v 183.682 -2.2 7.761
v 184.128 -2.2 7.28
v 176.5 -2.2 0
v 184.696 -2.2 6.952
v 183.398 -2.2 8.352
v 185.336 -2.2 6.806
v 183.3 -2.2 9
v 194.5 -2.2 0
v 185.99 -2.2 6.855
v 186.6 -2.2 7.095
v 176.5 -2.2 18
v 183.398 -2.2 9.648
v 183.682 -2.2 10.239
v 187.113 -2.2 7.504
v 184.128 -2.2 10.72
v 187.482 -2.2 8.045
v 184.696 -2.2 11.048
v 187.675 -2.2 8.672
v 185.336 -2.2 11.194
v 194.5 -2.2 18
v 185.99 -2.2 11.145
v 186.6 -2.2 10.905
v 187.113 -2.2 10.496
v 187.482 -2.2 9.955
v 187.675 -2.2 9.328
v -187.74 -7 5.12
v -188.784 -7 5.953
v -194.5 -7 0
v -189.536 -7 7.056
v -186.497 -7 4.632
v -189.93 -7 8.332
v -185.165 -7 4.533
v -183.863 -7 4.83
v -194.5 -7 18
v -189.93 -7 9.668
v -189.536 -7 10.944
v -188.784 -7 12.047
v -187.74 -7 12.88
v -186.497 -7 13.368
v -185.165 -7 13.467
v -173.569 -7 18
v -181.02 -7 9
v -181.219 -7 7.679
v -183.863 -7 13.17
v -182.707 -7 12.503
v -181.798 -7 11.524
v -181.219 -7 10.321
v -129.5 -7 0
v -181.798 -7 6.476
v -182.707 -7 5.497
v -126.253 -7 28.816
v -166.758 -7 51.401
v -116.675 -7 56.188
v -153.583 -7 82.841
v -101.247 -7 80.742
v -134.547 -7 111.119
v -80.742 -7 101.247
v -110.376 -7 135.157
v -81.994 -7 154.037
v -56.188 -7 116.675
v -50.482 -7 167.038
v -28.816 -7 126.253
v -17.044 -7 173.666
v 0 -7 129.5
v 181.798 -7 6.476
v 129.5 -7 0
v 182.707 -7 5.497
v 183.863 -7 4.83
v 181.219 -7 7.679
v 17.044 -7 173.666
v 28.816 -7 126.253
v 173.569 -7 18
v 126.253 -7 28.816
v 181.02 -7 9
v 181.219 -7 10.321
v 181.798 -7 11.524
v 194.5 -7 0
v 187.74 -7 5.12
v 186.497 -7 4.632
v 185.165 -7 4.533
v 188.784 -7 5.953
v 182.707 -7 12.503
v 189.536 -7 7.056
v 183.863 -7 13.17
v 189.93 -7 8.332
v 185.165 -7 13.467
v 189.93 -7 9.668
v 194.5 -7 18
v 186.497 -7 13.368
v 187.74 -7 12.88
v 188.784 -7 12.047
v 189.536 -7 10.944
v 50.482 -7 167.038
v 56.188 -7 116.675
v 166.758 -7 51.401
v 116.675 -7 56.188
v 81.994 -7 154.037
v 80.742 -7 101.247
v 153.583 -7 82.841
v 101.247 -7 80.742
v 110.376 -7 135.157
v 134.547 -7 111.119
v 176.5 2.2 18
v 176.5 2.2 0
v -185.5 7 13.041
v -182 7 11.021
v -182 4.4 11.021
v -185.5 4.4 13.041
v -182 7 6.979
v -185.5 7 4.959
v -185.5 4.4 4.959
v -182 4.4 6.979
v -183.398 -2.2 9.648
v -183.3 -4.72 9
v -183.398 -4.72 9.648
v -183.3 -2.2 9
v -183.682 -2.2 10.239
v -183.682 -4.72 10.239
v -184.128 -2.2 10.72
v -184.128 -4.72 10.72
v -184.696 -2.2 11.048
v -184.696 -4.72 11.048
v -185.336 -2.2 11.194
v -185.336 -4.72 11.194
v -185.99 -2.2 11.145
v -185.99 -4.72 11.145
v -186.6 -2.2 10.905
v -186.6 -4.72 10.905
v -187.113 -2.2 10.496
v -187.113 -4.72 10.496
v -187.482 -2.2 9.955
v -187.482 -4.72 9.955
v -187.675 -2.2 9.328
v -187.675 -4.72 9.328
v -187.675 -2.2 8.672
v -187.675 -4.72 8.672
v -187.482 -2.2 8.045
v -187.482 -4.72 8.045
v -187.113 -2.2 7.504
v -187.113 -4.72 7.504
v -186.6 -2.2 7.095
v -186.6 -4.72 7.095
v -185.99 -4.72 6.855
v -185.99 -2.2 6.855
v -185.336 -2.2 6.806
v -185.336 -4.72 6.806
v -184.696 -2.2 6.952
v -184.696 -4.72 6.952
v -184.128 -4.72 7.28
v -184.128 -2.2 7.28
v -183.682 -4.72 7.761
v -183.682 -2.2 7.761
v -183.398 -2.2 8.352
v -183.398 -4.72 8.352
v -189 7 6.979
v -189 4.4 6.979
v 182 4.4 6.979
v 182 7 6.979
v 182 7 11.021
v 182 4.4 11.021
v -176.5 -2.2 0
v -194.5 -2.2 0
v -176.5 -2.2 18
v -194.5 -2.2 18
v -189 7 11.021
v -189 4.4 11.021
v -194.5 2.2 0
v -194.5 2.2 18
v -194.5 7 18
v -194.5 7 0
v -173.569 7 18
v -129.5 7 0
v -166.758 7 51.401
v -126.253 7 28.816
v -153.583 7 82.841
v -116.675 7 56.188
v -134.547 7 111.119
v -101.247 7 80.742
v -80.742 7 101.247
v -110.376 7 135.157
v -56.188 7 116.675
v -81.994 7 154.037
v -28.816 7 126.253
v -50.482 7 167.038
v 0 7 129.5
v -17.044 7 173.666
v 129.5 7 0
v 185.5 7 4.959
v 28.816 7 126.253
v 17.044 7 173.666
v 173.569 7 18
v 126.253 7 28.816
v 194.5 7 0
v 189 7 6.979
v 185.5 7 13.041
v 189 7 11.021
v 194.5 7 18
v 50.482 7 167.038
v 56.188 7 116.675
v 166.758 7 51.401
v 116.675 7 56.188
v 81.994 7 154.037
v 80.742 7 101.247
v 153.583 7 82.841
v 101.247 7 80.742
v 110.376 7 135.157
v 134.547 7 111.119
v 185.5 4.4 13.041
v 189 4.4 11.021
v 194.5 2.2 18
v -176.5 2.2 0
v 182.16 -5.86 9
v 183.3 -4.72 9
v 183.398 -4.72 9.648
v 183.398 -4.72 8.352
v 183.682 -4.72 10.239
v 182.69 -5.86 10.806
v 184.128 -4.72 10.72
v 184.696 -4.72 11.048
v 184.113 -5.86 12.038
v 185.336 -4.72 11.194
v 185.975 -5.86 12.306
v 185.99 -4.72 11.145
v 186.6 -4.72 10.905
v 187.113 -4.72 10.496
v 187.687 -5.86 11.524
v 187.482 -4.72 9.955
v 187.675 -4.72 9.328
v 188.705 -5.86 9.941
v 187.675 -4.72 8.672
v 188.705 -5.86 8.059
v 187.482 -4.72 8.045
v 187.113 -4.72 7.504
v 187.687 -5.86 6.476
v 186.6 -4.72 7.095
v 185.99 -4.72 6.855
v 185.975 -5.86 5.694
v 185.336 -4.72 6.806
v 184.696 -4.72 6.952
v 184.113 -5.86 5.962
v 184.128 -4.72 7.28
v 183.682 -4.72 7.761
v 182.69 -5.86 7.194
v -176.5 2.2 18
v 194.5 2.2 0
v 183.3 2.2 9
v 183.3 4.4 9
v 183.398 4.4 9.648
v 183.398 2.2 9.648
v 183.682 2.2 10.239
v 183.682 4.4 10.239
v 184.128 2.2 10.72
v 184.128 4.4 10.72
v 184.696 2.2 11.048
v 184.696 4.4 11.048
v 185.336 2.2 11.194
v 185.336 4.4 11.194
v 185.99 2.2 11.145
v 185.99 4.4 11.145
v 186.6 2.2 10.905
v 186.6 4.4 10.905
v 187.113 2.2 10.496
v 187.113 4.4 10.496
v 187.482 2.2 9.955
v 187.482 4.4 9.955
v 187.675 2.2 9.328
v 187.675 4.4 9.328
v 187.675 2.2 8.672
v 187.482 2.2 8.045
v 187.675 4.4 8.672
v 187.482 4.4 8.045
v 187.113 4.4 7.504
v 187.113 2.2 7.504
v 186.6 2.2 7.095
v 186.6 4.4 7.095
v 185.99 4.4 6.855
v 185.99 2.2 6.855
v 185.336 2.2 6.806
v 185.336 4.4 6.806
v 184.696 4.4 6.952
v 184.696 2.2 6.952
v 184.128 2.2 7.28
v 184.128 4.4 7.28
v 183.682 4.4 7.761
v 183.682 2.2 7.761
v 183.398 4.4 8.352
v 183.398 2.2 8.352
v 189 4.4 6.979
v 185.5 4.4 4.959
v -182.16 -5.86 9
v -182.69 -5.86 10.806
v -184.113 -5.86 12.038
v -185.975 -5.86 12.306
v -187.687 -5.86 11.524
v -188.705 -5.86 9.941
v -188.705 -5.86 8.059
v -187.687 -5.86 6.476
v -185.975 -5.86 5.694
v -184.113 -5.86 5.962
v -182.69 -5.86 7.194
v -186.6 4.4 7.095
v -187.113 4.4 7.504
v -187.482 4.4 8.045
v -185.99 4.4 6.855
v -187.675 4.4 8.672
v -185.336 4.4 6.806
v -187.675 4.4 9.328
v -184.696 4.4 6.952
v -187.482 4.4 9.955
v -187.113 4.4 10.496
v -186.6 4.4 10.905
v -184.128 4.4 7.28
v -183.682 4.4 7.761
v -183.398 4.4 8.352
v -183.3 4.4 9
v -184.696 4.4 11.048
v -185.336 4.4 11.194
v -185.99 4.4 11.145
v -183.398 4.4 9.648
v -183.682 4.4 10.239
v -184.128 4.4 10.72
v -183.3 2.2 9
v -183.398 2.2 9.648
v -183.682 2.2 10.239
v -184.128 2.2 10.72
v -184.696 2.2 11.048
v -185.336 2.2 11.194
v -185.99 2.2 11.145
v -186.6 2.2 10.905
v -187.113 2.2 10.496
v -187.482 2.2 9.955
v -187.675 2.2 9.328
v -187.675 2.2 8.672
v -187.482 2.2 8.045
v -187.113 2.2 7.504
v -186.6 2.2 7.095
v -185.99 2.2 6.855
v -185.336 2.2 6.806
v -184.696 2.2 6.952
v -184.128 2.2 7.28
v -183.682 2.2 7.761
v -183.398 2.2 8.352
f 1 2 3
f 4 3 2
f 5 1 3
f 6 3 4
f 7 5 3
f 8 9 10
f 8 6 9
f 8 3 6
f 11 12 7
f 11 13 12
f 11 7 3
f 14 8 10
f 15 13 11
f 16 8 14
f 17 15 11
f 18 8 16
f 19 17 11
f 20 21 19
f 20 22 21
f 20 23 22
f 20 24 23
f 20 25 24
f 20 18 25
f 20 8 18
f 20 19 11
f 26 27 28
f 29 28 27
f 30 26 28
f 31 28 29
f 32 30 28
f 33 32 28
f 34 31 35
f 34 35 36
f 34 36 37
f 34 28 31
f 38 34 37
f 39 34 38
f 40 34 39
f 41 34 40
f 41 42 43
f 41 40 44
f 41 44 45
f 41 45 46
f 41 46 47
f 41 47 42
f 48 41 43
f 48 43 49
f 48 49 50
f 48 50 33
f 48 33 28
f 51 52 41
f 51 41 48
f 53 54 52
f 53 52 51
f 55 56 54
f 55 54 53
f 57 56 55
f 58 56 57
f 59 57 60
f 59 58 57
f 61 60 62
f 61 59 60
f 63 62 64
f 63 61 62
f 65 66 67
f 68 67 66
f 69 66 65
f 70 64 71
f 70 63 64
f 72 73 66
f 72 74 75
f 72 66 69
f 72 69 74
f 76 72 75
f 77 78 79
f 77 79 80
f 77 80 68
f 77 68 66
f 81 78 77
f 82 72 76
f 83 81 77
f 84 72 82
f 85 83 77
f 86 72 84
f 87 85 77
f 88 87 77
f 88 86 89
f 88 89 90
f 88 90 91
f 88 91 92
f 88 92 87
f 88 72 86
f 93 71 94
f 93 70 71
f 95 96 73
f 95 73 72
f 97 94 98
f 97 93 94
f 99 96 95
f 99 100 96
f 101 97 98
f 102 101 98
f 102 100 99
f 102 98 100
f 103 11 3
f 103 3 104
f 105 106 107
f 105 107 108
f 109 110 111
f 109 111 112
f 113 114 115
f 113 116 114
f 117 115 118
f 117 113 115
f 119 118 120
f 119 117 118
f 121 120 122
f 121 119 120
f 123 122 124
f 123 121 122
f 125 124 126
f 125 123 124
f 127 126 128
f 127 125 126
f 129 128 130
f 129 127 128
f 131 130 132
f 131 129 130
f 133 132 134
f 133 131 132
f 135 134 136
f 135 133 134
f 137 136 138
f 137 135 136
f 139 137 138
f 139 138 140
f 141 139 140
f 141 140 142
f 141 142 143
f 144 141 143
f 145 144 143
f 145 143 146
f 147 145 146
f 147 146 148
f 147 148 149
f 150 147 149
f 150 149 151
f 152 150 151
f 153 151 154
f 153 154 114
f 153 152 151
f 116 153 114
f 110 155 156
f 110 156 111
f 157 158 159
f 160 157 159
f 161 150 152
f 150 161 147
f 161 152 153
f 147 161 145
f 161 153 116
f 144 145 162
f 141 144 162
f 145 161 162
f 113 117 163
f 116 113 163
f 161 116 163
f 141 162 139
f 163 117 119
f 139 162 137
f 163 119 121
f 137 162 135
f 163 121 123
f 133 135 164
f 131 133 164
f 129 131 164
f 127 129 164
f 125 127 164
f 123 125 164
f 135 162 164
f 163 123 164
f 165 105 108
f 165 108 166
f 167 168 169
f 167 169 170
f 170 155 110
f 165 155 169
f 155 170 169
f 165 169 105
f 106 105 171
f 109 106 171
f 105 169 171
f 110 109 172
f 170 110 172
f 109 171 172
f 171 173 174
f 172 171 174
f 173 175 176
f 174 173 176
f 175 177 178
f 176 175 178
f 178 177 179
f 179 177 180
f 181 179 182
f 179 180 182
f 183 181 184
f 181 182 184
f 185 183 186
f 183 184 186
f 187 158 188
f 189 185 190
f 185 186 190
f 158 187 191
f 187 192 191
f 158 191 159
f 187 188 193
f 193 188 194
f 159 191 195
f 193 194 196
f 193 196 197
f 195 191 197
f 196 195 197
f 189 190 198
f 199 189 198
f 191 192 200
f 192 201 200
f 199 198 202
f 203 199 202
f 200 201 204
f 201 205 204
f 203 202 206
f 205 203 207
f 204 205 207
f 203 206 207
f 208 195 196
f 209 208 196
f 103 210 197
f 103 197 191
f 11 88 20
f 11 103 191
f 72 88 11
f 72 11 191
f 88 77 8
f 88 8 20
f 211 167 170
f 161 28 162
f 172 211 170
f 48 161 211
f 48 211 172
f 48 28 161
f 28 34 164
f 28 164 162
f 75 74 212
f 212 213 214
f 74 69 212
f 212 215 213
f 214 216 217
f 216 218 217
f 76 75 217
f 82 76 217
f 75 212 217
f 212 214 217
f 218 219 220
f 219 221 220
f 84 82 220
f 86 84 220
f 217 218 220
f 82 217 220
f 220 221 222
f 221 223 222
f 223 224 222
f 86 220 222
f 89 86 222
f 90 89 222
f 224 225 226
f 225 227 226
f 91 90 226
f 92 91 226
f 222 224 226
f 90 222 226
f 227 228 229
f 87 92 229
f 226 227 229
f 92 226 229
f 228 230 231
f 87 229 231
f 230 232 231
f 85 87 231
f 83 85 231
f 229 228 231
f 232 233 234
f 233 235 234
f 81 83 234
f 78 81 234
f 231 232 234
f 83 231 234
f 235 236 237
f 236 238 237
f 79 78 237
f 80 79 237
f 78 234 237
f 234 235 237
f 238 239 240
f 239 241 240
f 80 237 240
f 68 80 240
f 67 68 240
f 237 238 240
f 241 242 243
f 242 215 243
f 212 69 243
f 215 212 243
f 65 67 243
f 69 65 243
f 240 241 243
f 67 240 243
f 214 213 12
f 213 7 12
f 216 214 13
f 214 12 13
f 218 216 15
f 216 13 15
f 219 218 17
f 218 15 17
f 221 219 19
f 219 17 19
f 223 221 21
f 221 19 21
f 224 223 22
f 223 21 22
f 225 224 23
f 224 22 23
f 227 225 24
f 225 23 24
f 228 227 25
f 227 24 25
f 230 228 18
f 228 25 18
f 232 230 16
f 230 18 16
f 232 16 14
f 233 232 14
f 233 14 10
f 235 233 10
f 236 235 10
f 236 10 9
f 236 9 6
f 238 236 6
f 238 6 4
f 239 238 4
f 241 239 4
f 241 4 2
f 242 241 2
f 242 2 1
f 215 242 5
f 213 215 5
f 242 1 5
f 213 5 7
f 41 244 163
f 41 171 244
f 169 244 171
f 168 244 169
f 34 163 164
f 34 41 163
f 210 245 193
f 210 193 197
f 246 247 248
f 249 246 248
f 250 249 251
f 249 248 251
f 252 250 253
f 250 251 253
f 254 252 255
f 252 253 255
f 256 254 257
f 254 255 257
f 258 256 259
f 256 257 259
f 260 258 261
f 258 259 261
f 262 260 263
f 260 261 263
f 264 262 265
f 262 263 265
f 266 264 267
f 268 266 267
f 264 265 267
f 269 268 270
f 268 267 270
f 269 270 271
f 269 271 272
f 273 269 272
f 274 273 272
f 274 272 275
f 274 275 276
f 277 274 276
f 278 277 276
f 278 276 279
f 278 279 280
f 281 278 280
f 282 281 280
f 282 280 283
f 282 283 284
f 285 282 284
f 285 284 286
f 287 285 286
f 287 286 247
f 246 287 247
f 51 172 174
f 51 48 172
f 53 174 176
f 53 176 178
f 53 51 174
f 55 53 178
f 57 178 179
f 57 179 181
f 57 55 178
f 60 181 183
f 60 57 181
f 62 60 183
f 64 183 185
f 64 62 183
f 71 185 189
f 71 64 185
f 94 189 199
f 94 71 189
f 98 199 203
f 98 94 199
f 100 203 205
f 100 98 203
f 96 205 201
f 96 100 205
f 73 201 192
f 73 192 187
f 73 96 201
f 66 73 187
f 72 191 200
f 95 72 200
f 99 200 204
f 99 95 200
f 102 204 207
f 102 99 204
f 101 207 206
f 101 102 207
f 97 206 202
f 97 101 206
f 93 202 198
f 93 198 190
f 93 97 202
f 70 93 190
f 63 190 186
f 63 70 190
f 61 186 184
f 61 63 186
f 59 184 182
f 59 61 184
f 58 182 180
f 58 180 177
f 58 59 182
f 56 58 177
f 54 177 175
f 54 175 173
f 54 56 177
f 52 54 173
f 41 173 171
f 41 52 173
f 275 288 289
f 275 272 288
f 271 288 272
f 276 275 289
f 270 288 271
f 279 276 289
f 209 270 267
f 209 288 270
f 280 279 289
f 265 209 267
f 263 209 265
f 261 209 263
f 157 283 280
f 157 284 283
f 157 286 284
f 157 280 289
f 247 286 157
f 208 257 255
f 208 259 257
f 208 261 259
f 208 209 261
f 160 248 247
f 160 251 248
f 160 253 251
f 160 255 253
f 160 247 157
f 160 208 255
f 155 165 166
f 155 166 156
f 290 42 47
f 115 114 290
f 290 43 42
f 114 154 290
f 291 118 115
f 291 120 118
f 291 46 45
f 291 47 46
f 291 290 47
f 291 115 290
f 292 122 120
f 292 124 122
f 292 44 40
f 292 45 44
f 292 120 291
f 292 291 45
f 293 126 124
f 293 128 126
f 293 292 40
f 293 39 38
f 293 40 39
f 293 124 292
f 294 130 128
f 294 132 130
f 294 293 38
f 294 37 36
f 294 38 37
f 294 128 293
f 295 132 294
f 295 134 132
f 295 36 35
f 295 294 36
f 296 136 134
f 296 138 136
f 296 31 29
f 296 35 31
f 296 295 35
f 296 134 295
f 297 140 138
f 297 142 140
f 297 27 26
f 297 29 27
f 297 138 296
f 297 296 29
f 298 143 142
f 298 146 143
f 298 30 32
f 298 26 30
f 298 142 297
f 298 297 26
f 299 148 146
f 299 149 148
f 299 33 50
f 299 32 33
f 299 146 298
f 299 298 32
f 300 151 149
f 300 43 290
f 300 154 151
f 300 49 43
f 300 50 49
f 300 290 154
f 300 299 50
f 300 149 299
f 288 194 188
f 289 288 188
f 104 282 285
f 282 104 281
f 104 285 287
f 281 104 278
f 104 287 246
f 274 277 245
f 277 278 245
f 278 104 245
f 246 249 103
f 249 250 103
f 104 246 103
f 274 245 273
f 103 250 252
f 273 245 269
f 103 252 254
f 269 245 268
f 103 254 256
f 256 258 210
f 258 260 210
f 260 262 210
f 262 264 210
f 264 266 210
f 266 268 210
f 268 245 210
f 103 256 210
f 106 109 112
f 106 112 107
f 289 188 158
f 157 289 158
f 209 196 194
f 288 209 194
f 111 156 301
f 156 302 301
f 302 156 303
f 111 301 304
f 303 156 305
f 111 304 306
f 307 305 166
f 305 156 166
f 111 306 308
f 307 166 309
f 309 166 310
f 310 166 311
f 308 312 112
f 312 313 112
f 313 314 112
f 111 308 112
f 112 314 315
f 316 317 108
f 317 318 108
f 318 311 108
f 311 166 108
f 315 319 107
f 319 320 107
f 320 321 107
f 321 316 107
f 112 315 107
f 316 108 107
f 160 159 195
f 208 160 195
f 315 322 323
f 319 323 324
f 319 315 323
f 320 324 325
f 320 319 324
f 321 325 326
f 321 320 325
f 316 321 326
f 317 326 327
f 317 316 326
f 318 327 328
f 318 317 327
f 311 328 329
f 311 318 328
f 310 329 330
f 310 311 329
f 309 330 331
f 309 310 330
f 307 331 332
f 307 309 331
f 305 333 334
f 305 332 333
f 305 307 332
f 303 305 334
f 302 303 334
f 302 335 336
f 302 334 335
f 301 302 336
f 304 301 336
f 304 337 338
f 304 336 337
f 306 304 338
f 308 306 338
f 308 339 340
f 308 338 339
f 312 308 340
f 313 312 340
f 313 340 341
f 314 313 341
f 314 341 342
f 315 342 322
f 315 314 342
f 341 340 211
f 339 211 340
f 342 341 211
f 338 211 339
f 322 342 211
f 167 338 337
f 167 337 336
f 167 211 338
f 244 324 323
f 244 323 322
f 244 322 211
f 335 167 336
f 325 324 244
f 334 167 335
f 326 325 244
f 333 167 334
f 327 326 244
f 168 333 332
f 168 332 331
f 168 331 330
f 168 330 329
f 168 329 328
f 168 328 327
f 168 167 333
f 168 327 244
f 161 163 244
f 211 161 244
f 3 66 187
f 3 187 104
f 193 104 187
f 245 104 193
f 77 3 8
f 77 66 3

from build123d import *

# Parameters (mm, degrees)
F1_DEPTH       = 7
F2_DEPTH       = 6
F3_W           = 4.4
F3_H           = 18
F4_DEPTH       = 18
F6_D           = 4.4
F6_DEPTH       = 5
F6_CSINK_D     = 8.96
F6_CSINK_ANGLE = 90
F6_TIP         = 1.3218933619
F8_DEPTH       = 2.6
F9_R           = 2.2
F10_DEPTH      = 2.3


# Not quite as in the source:
# - a pattern or mirror of a feature is missing from the dataset's text; its kind, count and spacing are read off the source's solid


with BuildPart() as f1:
    # F0 (on Front) → F1 (new body, symmetric)
    with BuildSketch(Plane.XZ):
        with BuildLine():
            Line((129.5, 0), (174.5, 0))
            ThreePointArc((174.5, 0), (174.2671322418, 9.0120264206), (173.5691504848, 18))
            ThreePointArc((173.5691504848, 18), (0, 174.5), (-173.5691504848, 18))
            ThreePointArc((-173.5691504848, 18), (-174.2671322418, 9.0120264206), (-174.5, 0))
            Line((-174.5, 0), (-129.5, 0))
            ThreePointArc((-129.5, 0), (0, 129.5), (129.5, 0))
        make_face()
        with BuildLine():
            ThreePointArc((173.5691504848, 18), (174.2671322418, 9.0120264206), (174.5, 0))
            Line((174.5, 0), (194.5, 0))
            Line((194.5, 0), (194.5, 18))
            Line((194.5, 18), (173.5691504848, 18))
        make_face()
        with BuildLine():
            ThreePointArc((-174.5, 0), (-174.2671322418, 9.0120264206), (-173.5691504848, 18))
            Line((-173.5691504848, 18), (-194.5, 18))
            Line((-194.5, 18), (-194.5, 0))
            Line((-194.5, 0), (-174.5, 0))
        make_face()
    extrude(amount=F1_DEPTH, both=True)

    # F0 (on Front) → F2 (join, symmetric)
    with BuildSketch(Plane.XZ):
        with BuildLine():
            Line((129.5, 0), (174.5, 0))
            ThreePointArc((174.5, 0), (174.2671322418, 9.0120264206), (173.5691504848, 18))
            ThreePointArc((173.5691504848, 18), (0, 174.5), (-173.5691504848, 18))
            ThreePointArc((-173.5691504848, 18), (-174.2671322418, 9.0120264206), (-174.5, 0))
            Line((-174.5, 0), (-129.5, 0))
            ThreePointArc((-129.5, 0), (0, 129.5), (129.5, 0))
        make_face()
        with BuildLine():
            ThreePointArc((173.5691504848, 18), (174.2671322418, 9.0120264206), (174.5, 0))
            Line((174.5, 0), (194.5, 0))
            Line((194.5, 0), (194.5, 18))
            Line((194.5, 18), (173.5691504848, 18))
        make_face()
        with BuildLine():
            ThreePointArc((-174.5, 0), (-174.2671322418, 9.0120264206), (-173.5691504848, 18))
            Line((-173.5691504848, 18), (-194.5, 18))
            Line((-194.5, 18), (-194.5, 0))
            Line((-194.5, 0), (-174.5, 0))
        make_face()
    extrude(amount=F2_DEPTH, both=True)

    # F3 (on face) → F4 (cut)
    with BuildSketch(Plane.YZ.offset(194.5)):
        with Locations((0, 9)):
            Rectangle(F3_W, F3_H)
    f4 = extrude(amount=-F4_DEPTH, mode=Mode.SUBTRACT)

    # F4_copies: F4 across plane
    add(f4.mirror(Plane(origin=(0, 0, 0), x_dir=(0, 0, -1), z_dir=(-1, 0, 0))), mode=Mode.SUBTRACT)

    # F6
    with Locations(Plane.XZ.offset(7)):
        with Locations((185.5, 9)):
            f6 = CounterSinkHole(F6_D / 2, F6_CSINK_D / 2, depth=F6_DEPTH, counter_sink_angle=F6_CSINK_ANGLE)
            with Locations((0, 0, -(F6_DEPTH + F6_TIP / 2))):  # 118° drill point
                Cone(0, F6_D / 2, F6_TIP, mode=Mode.SUBTRACT)

    # F6_copies: F6 across plane
    add(f6.mirror(Plane(origin=(0, 0, 0), x_dir=(0, 0, -1), z_dir=(-1, 0, 0))), mode=Mode.SUBTRACT)

    # F7 (on face) → F8 (cut)
    with BuildSketch(Plane(origin=(0, 7, 0), x_dir=(-1, 0, 0), z_dir=(0, 1, 0))):
        Polygon((-189, 11.0207259422), (-189, 6.9792740578), (-185.5, 4.9585481157), (-182, 6.9792740578), (-182, 11.0207259422), (-185.5, 13.0414518843), align=None)
    f8 = extrude(amount=-F8_DEPTH, mode=Mode.SUBTRACT)

    # F8_copies: F8 across plane
    add(f8.mirror(Plane(origin=(0, 0, 0), x_dir=(0, 0, -1), z_dir=(-1, 0, 0))), mode=Mode.SUBTRACT)

    # F9 (on face) → F10 (cut)
    with BuildSketch(Plane(origin=(0, 4.4, 0), x_dir=(-1, 0, 0), z_dir=(0, 1, 0))):
        with Locations((-185.5, 9)):
            Circle(F9_R)
    f10 = extrude(amount=-F10_DEPTH, mode=Mode.SUBTRACT)

    # F10_copies: F10 across plane
    add(f10.mirror(Plane(origin=(0, 0, 0), x_dir=(0, 0, -1), z_dir=(-1, 0, 0))), mode=Mode.SUBTRACT)


solid = f1.part
